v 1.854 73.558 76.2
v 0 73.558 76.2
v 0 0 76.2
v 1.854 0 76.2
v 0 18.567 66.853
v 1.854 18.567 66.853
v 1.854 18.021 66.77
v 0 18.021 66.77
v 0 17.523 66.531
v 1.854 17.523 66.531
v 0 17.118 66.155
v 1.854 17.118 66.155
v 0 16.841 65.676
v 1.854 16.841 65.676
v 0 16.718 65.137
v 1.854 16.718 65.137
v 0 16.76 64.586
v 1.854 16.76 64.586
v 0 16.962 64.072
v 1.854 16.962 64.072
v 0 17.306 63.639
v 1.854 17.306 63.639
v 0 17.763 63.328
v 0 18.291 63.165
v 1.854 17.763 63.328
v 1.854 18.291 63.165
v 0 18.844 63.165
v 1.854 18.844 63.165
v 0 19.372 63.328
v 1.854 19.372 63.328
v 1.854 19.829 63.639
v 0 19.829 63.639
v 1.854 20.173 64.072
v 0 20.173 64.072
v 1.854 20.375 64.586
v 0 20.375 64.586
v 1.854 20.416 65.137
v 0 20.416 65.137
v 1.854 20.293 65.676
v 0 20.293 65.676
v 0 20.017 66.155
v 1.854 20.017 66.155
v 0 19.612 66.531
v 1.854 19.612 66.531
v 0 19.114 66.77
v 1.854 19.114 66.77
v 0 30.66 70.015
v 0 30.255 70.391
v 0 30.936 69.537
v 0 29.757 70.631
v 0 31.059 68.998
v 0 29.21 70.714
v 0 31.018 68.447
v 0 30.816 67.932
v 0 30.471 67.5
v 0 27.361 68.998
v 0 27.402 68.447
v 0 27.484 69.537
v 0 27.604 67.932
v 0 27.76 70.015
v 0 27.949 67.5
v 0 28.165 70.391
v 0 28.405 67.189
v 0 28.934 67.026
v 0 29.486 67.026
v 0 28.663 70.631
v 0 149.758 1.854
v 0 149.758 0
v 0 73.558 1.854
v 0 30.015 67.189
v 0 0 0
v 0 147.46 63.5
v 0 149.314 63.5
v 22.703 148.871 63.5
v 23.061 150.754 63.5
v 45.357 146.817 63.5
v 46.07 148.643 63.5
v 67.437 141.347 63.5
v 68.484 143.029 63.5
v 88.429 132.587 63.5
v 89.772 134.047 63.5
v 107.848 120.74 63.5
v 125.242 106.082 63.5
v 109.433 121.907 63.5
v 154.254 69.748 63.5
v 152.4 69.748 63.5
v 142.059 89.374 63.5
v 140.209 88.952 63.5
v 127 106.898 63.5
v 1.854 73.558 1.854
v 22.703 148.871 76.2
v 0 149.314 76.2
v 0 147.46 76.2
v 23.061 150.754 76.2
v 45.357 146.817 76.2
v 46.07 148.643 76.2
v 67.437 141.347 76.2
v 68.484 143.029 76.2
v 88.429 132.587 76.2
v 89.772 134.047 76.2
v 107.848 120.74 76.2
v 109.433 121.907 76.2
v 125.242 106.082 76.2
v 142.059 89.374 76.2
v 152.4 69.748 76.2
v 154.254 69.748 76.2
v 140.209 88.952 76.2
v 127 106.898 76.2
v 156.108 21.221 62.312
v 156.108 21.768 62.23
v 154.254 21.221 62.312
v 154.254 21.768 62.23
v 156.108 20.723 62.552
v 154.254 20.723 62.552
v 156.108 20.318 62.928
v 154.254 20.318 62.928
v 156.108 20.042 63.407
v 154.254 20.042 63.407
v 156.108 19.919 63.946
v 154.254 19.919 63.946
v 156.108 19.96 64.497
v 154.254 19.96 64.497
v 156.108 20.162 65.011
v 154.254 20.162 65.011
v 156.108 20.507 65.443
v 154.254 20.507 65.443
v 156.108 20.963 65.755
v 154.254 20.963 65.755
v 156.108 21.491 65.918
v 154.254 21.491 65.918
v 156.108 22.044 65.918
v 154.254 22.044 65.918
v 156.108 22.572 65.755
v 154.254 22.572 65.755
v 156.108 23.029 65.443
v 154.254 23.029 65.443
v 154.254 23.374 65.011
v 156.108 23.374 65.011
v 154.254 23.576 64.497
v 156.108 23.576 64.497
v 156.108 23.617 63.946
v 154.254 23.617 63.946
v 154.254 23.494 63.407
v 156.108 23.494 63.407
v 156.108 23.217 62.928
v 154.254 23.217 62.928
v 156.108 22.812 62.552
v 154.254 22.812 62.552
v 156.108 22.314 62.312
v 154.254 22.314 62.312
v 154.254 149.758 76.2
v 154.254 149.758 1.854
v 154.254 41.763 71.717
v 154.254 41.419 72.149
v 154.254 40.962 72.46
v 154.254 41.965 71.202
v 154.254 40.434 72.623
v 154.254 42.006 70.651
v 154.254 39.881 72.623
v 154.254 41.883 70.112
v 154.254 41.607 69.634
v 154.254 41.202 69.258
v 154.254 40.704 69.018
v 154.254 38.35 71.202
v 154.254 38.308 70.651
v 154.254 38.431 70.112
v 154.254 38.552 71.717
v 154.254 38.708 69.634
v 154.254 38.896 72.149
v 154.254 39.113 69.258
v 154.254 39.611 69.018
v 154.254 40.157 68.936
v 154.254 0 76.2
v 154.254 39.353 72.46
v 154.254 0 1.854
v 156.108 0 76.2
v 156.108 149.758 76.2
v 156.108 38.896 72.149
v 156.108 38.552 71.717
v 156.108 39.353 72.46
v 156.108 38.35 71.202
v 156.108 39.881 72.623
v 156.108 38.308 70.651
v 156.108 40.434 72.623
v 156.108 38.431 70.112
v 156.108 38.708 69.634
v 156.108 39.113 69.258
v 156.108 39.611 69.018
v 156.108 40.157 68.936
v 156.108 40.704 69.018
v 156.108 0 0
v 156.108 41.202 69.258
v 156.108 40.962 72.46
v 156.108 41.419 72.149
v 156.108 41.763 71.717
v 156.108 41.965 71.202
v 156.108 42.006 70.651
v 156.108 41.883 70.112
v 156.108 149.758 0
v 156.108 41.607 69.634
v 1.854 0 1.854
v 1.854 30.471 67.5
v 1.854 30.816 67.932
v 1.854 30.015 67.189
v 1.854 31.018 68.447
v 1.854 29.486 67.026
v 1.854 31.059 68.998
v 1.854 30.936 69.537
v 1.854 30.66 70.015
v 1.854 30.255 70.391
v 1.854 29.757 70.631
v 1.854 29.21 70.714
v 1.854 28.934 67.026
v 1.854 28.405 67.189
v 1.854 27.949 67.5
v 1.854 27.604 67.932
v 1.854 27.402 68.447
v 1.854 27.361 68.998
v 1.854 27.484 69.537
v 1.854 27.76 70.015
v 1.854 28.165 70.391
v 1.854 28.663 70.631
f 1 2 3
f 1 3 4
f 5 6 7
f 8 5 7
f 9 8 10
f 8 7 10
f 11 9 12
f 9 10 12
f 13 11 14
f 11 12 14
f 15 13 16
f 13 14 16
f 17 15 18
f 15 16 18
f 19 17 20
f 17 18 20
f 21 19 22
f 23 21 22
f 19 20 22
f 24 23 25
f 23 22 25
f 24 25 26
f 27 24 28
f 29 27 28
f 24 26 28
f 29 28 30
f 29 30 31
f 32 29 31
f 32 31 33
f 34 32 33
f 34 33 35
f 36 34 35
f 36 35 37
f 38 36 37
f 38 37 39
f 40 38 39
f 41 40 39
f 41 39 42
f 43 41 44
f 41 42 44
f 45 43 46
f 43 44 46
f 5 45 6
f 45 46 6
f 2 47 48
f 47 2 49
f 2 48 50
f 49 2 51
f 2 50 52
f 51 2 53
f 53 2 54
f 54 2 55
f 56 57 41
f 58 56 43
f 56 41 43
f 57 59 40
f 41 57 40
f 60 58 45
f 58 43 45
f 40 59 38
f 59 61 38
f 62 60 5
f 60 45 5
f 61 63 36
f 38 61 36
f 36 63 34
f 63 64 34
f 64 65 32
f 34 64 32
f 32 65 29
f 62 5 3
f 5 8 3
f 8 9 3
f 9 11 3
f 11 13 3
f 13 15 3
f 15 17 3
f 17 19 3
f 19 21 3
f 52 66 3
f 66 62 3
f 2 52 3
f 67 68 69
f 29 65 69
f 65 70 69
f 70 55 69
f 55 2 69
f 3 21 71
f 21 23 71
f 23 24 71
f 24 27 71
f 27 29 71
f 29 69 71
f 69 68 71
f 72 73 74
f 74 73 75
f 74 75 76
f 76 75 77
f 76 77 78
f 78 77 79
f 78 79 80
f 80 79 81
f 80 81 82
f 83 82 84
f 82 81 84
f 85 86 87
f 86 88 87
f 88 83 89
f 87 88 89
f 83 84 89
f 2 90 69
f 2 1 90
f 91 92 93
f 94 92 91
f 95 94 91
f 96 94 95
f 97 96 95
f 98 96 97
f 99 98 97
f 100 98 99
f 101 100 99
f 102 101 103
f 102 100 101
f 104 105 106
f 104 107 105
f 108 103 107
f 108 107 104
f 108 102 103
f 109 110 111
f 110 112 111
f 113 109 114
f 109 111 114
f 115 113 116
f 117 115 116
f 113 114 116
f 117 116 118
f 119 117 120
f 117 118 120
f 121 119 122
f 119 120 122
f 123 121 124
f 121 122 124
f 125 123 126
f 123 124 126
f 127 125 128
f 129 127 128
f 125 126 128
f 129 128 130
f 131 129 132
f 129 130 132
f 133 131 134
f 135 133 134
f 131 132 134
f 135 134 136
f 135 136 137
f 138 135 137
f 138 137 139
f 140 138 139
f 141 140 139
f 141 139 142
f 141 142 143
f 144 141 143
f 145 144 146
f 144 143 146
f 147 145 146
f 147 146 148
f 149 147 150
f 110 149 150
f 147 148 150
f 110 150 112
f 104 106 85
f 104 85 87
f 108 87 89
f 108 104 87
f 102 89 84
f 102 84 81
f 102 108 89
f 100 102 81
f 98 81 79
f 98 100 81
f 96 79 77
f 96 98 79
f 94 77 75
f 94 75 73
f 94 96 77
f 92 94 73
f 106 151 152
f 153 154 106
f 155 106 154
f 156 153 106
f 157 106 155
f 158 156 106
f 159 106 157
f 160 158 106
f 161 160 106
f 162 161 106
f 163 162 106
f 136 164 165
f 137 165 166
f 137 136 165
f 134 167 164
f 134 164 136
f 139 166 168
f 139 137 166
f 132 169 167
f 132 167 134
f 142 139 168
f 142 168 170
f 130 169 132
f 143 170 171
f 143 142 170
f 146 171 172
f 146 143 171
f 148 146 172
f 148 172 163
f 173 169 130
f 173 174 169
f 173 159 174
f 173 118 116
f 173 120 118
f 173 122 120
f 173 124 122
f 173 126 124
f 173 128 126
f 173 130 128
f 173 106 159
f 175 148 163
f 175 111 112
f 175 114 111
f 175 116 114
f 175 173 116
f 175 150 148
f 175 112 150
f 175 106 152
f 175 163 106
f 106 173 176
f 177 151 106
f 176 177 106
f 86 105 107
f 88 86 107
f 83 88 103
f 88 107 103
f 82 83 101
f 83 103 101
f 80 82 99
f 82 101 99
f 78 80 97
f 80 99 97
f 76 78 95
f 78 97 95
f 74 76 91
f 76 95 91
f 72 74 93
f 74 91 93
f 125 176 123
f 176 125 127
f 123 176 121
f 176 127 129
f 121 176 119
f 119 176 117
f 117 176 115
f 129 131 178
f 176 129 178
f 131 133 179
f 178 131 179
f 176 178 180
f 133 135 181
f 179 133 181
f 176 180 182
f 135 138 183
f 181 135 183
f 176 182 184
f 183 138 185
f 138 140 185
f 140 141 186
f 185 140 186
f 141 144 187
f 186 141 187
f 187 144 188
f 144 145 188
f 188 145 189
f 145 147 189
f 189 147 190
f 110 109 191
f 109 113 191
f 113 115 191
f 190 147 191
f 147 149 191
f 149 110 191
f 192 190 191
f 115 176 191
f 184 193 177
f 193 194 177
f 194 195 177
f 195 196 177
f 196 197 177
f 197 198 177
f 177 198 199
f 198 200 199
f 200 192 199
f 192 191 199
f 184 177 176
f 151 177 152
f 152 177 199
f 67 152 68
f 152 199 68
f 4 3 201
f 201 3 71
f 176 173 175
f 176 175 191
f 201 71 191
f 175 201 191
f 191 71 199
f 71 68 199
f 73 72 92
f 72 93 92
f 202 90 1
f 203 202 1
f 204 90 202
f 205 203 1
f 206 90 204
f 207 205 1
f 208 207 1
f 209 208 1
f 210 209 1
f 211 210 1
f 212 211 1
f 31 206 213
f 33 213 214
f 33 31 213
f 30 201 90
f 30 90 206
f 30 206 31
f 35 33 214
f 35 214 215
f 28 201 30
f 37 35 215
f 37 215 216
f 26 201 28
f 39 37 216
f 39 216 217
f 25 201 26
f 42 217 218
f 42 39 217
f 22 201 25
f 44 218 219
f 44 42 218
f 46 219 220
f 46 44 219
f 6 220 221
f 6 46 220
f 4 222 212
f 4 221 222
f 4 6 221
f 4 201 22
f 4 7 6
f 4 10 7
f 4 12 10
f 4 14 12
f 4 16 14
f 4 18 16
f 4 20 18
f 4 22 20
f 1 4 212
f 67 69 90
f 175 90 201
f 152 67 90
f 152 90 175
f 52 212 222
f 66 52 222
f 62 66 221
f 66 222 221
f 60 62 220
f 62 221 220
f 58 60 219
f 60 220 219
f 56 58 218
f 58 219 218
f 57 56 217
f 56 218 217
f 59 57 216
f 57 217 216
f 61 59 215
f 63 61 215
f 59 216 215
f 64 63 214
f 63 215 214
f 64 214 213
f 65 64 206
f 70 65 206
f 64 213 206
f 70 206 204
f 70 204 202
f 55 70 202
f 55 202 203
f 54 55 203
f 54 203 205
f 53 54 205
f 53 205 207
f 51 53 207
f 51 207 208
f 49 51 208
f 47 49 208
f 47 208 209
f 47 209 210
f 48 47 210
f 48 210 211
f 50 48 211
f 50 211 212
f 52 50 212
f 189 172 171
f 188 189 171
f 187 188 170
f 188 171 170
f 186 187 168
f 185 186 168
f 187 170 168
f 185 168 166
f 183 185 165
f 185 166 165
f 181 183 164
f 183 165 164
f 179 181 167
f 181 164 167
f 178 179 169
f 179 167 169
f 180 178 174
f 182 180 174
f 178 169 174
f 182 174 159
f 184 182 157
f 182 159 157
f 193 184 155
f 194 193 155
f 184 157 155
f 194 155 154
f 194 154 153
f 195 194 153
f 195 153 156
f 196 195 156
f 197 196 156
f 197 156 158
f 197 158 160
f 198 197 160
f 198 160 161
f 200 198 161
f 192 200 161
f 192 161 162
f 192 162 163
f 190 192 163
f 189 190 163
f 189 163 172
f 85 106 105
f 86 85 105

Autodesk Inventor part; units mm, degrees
ref_plane "YZ Plane" through (0, 0, 0) normal (1, 0, 0) x (0, 1, 0)
ref_plane "XZ Plane" through (0, 0, 0) normal (0, 1, 0) x (-1, 0, 0)
ref_plane "XY Plane" through (0, 0, 0) normal (0, 0, 1) x (1, 0, 0)
sketch "Sketch1" plane through (0, 0, 0) normal (0, 0, 1) x (1, 0, 0)
  line L0 (0, 0) -> (156.1084, 0)
  line L1 (156.1084, 0) -> (156.1084, 149.7584)
  line L2 (156.1084, 149.7584) -> (0, 149.7584)
  line L3 (0, 149.7584) -> (0, 0)
  dimension "d0" = 156.1084
  dimension "d1" = 149.7584
extrude "Extrusion1" add sketch "Sketch1" along normal blind 76.2
sketch "Sketch2" plane through (0, 0, 0) normal (0, -1, 0) x (1, 0, 0)
  line L0 (156.1084, 0) -> (156.1084, 76.2) projected
  line L1 (0, 0) -> (156.1084, 0) projected
  line L2 (0, 76.2) -> (156.1084, 76.2) projected
  line L3 (154.2542, 1.8542) -> (1.8542, 1.8542)
  line L4 (1.8542, 1.8542) -> (1.8542, 76.2)
  line L5 (1.8542, 76.2) -> (154.2542, 76.2)
  line L6 (154.2542, 76.2) -> (154.2542, 1.8542)
  dimension "d4" = 1.8542
  dimension "d5" = 1.8542
  dimension "d6" = 152.4
  dimension "d49" = 156.1084
extrude "Extrusion2" cut sketch "Sketch2" against normal blind 228.6
sketch "Sketch3" plane through (0, 0, 76.2) normal (0, 0, 1) x (1, 0, 0)
  line L0 (1.8542, 0) -> (1.8542, 149.7584) projected
  line L1 (0, 149.7584) -> (1.8542, 149.7584)
  line L2 (1.8542, 149.7584) -> (1.8542, 73.5584)
  line L3 (1.8542, 73.5584) -> (0, 73.5584)
  line L4 (0, 73.5584) -> (0, 149.7584)
  line L5 (1.8542, 149.7584) -> (154.2542, 149.7584) projected
  point P0 (0, 0)
  dimension "d9" = 76.2
extrude "Extrusion3" cut sketch "Sketch3" against normal blind 74.3458
sketch "Sketch9" plane through (0, 0, 76.2) normal (0, 0, 1) x (1, 0, 0)
  line L0 (154.2542, 149.7584) -> (154.2542, 0) projected
  line L1 (0, 73.5584) -> (0, 149.7584) projected
  arc A0 (154.2542, 69.7484) -> (0, 149.3143) centre (20.8699, 0.4656) ccw
  line L2 (0, 149.3143) -> (218.1484, 149.3143) construction
  line L3 (154.2542, 69.7484) -> (152.4, 69.7484)
  arc A1 (152.4, 69.7484) -> (0, 147.4601) centre (20.5853, -0.4615) ccw
  line L4 (156.1084, 149.7584) -> (154.2542, 149.7584) projected
  line L5 (0, 149.3143) -> (0, 147.4601)
  point P0 (0, 0)
  dimension "d23" = 1.8542
  dimension "d24" = 1.8542
  dimension "d50" = 0.9271
  dimension "d51" = 80.01
extrude "Extrusion7" add sketch "Sketch9" against normal blind 12.7
sketch "Sketch10" plane through (0, 0, 0) normal (-1, 0, 0) x (0, 0, 1)
  line L0 (0, 0) -> (76.2, 0) projected
  line L1 (76.2, 149.7584) -> (76.2, 0) projected
  point P0 (64.9986, 18.5674)
  point P1 (76.2, 73.5584)
  point P2 (68.8594, 29.21)
  dimension "d27" = 18.5674
  dimension "d28" = 11.2014
  dimension "d29" = 7.3406
  dimension "d30" = 29.21
hole "Hole1" at (0, 29.21, 68.8594) at (0, 18.5674, 64.9986) direction (1, 0, 0) diameter 3.7084 depth 1.8542
sketch "Sketch11" plane through (156.1084, 0, 0) normal (1, 0, 0) x (0, 0, -1)
  line L0 (0, 0) -> (-76.2, 0) projected
  line L1 (-76.2, 0) -> (-76.2, 149.7584) projected
  point P0 (-70.7898, 40.1574)
  point P1 (-64.0842, 21.7678)
  dimension "d38" = 40.1574
  dimension "d39" = 5.4102
  dimension "d40" = 12.1158
  dimension "d41" = 21.7678
hole "Hole2" at (156.1084, 40.1574, 70.7898) at (156.1084, 21.7678, 64.0842) direction (-1, 0, 0) diameter 3.7084 depth 1.8542
equation "\"d6\" = d49 - 2 * d5"
properties part number "Sorter" material "Aluminum 6061"
